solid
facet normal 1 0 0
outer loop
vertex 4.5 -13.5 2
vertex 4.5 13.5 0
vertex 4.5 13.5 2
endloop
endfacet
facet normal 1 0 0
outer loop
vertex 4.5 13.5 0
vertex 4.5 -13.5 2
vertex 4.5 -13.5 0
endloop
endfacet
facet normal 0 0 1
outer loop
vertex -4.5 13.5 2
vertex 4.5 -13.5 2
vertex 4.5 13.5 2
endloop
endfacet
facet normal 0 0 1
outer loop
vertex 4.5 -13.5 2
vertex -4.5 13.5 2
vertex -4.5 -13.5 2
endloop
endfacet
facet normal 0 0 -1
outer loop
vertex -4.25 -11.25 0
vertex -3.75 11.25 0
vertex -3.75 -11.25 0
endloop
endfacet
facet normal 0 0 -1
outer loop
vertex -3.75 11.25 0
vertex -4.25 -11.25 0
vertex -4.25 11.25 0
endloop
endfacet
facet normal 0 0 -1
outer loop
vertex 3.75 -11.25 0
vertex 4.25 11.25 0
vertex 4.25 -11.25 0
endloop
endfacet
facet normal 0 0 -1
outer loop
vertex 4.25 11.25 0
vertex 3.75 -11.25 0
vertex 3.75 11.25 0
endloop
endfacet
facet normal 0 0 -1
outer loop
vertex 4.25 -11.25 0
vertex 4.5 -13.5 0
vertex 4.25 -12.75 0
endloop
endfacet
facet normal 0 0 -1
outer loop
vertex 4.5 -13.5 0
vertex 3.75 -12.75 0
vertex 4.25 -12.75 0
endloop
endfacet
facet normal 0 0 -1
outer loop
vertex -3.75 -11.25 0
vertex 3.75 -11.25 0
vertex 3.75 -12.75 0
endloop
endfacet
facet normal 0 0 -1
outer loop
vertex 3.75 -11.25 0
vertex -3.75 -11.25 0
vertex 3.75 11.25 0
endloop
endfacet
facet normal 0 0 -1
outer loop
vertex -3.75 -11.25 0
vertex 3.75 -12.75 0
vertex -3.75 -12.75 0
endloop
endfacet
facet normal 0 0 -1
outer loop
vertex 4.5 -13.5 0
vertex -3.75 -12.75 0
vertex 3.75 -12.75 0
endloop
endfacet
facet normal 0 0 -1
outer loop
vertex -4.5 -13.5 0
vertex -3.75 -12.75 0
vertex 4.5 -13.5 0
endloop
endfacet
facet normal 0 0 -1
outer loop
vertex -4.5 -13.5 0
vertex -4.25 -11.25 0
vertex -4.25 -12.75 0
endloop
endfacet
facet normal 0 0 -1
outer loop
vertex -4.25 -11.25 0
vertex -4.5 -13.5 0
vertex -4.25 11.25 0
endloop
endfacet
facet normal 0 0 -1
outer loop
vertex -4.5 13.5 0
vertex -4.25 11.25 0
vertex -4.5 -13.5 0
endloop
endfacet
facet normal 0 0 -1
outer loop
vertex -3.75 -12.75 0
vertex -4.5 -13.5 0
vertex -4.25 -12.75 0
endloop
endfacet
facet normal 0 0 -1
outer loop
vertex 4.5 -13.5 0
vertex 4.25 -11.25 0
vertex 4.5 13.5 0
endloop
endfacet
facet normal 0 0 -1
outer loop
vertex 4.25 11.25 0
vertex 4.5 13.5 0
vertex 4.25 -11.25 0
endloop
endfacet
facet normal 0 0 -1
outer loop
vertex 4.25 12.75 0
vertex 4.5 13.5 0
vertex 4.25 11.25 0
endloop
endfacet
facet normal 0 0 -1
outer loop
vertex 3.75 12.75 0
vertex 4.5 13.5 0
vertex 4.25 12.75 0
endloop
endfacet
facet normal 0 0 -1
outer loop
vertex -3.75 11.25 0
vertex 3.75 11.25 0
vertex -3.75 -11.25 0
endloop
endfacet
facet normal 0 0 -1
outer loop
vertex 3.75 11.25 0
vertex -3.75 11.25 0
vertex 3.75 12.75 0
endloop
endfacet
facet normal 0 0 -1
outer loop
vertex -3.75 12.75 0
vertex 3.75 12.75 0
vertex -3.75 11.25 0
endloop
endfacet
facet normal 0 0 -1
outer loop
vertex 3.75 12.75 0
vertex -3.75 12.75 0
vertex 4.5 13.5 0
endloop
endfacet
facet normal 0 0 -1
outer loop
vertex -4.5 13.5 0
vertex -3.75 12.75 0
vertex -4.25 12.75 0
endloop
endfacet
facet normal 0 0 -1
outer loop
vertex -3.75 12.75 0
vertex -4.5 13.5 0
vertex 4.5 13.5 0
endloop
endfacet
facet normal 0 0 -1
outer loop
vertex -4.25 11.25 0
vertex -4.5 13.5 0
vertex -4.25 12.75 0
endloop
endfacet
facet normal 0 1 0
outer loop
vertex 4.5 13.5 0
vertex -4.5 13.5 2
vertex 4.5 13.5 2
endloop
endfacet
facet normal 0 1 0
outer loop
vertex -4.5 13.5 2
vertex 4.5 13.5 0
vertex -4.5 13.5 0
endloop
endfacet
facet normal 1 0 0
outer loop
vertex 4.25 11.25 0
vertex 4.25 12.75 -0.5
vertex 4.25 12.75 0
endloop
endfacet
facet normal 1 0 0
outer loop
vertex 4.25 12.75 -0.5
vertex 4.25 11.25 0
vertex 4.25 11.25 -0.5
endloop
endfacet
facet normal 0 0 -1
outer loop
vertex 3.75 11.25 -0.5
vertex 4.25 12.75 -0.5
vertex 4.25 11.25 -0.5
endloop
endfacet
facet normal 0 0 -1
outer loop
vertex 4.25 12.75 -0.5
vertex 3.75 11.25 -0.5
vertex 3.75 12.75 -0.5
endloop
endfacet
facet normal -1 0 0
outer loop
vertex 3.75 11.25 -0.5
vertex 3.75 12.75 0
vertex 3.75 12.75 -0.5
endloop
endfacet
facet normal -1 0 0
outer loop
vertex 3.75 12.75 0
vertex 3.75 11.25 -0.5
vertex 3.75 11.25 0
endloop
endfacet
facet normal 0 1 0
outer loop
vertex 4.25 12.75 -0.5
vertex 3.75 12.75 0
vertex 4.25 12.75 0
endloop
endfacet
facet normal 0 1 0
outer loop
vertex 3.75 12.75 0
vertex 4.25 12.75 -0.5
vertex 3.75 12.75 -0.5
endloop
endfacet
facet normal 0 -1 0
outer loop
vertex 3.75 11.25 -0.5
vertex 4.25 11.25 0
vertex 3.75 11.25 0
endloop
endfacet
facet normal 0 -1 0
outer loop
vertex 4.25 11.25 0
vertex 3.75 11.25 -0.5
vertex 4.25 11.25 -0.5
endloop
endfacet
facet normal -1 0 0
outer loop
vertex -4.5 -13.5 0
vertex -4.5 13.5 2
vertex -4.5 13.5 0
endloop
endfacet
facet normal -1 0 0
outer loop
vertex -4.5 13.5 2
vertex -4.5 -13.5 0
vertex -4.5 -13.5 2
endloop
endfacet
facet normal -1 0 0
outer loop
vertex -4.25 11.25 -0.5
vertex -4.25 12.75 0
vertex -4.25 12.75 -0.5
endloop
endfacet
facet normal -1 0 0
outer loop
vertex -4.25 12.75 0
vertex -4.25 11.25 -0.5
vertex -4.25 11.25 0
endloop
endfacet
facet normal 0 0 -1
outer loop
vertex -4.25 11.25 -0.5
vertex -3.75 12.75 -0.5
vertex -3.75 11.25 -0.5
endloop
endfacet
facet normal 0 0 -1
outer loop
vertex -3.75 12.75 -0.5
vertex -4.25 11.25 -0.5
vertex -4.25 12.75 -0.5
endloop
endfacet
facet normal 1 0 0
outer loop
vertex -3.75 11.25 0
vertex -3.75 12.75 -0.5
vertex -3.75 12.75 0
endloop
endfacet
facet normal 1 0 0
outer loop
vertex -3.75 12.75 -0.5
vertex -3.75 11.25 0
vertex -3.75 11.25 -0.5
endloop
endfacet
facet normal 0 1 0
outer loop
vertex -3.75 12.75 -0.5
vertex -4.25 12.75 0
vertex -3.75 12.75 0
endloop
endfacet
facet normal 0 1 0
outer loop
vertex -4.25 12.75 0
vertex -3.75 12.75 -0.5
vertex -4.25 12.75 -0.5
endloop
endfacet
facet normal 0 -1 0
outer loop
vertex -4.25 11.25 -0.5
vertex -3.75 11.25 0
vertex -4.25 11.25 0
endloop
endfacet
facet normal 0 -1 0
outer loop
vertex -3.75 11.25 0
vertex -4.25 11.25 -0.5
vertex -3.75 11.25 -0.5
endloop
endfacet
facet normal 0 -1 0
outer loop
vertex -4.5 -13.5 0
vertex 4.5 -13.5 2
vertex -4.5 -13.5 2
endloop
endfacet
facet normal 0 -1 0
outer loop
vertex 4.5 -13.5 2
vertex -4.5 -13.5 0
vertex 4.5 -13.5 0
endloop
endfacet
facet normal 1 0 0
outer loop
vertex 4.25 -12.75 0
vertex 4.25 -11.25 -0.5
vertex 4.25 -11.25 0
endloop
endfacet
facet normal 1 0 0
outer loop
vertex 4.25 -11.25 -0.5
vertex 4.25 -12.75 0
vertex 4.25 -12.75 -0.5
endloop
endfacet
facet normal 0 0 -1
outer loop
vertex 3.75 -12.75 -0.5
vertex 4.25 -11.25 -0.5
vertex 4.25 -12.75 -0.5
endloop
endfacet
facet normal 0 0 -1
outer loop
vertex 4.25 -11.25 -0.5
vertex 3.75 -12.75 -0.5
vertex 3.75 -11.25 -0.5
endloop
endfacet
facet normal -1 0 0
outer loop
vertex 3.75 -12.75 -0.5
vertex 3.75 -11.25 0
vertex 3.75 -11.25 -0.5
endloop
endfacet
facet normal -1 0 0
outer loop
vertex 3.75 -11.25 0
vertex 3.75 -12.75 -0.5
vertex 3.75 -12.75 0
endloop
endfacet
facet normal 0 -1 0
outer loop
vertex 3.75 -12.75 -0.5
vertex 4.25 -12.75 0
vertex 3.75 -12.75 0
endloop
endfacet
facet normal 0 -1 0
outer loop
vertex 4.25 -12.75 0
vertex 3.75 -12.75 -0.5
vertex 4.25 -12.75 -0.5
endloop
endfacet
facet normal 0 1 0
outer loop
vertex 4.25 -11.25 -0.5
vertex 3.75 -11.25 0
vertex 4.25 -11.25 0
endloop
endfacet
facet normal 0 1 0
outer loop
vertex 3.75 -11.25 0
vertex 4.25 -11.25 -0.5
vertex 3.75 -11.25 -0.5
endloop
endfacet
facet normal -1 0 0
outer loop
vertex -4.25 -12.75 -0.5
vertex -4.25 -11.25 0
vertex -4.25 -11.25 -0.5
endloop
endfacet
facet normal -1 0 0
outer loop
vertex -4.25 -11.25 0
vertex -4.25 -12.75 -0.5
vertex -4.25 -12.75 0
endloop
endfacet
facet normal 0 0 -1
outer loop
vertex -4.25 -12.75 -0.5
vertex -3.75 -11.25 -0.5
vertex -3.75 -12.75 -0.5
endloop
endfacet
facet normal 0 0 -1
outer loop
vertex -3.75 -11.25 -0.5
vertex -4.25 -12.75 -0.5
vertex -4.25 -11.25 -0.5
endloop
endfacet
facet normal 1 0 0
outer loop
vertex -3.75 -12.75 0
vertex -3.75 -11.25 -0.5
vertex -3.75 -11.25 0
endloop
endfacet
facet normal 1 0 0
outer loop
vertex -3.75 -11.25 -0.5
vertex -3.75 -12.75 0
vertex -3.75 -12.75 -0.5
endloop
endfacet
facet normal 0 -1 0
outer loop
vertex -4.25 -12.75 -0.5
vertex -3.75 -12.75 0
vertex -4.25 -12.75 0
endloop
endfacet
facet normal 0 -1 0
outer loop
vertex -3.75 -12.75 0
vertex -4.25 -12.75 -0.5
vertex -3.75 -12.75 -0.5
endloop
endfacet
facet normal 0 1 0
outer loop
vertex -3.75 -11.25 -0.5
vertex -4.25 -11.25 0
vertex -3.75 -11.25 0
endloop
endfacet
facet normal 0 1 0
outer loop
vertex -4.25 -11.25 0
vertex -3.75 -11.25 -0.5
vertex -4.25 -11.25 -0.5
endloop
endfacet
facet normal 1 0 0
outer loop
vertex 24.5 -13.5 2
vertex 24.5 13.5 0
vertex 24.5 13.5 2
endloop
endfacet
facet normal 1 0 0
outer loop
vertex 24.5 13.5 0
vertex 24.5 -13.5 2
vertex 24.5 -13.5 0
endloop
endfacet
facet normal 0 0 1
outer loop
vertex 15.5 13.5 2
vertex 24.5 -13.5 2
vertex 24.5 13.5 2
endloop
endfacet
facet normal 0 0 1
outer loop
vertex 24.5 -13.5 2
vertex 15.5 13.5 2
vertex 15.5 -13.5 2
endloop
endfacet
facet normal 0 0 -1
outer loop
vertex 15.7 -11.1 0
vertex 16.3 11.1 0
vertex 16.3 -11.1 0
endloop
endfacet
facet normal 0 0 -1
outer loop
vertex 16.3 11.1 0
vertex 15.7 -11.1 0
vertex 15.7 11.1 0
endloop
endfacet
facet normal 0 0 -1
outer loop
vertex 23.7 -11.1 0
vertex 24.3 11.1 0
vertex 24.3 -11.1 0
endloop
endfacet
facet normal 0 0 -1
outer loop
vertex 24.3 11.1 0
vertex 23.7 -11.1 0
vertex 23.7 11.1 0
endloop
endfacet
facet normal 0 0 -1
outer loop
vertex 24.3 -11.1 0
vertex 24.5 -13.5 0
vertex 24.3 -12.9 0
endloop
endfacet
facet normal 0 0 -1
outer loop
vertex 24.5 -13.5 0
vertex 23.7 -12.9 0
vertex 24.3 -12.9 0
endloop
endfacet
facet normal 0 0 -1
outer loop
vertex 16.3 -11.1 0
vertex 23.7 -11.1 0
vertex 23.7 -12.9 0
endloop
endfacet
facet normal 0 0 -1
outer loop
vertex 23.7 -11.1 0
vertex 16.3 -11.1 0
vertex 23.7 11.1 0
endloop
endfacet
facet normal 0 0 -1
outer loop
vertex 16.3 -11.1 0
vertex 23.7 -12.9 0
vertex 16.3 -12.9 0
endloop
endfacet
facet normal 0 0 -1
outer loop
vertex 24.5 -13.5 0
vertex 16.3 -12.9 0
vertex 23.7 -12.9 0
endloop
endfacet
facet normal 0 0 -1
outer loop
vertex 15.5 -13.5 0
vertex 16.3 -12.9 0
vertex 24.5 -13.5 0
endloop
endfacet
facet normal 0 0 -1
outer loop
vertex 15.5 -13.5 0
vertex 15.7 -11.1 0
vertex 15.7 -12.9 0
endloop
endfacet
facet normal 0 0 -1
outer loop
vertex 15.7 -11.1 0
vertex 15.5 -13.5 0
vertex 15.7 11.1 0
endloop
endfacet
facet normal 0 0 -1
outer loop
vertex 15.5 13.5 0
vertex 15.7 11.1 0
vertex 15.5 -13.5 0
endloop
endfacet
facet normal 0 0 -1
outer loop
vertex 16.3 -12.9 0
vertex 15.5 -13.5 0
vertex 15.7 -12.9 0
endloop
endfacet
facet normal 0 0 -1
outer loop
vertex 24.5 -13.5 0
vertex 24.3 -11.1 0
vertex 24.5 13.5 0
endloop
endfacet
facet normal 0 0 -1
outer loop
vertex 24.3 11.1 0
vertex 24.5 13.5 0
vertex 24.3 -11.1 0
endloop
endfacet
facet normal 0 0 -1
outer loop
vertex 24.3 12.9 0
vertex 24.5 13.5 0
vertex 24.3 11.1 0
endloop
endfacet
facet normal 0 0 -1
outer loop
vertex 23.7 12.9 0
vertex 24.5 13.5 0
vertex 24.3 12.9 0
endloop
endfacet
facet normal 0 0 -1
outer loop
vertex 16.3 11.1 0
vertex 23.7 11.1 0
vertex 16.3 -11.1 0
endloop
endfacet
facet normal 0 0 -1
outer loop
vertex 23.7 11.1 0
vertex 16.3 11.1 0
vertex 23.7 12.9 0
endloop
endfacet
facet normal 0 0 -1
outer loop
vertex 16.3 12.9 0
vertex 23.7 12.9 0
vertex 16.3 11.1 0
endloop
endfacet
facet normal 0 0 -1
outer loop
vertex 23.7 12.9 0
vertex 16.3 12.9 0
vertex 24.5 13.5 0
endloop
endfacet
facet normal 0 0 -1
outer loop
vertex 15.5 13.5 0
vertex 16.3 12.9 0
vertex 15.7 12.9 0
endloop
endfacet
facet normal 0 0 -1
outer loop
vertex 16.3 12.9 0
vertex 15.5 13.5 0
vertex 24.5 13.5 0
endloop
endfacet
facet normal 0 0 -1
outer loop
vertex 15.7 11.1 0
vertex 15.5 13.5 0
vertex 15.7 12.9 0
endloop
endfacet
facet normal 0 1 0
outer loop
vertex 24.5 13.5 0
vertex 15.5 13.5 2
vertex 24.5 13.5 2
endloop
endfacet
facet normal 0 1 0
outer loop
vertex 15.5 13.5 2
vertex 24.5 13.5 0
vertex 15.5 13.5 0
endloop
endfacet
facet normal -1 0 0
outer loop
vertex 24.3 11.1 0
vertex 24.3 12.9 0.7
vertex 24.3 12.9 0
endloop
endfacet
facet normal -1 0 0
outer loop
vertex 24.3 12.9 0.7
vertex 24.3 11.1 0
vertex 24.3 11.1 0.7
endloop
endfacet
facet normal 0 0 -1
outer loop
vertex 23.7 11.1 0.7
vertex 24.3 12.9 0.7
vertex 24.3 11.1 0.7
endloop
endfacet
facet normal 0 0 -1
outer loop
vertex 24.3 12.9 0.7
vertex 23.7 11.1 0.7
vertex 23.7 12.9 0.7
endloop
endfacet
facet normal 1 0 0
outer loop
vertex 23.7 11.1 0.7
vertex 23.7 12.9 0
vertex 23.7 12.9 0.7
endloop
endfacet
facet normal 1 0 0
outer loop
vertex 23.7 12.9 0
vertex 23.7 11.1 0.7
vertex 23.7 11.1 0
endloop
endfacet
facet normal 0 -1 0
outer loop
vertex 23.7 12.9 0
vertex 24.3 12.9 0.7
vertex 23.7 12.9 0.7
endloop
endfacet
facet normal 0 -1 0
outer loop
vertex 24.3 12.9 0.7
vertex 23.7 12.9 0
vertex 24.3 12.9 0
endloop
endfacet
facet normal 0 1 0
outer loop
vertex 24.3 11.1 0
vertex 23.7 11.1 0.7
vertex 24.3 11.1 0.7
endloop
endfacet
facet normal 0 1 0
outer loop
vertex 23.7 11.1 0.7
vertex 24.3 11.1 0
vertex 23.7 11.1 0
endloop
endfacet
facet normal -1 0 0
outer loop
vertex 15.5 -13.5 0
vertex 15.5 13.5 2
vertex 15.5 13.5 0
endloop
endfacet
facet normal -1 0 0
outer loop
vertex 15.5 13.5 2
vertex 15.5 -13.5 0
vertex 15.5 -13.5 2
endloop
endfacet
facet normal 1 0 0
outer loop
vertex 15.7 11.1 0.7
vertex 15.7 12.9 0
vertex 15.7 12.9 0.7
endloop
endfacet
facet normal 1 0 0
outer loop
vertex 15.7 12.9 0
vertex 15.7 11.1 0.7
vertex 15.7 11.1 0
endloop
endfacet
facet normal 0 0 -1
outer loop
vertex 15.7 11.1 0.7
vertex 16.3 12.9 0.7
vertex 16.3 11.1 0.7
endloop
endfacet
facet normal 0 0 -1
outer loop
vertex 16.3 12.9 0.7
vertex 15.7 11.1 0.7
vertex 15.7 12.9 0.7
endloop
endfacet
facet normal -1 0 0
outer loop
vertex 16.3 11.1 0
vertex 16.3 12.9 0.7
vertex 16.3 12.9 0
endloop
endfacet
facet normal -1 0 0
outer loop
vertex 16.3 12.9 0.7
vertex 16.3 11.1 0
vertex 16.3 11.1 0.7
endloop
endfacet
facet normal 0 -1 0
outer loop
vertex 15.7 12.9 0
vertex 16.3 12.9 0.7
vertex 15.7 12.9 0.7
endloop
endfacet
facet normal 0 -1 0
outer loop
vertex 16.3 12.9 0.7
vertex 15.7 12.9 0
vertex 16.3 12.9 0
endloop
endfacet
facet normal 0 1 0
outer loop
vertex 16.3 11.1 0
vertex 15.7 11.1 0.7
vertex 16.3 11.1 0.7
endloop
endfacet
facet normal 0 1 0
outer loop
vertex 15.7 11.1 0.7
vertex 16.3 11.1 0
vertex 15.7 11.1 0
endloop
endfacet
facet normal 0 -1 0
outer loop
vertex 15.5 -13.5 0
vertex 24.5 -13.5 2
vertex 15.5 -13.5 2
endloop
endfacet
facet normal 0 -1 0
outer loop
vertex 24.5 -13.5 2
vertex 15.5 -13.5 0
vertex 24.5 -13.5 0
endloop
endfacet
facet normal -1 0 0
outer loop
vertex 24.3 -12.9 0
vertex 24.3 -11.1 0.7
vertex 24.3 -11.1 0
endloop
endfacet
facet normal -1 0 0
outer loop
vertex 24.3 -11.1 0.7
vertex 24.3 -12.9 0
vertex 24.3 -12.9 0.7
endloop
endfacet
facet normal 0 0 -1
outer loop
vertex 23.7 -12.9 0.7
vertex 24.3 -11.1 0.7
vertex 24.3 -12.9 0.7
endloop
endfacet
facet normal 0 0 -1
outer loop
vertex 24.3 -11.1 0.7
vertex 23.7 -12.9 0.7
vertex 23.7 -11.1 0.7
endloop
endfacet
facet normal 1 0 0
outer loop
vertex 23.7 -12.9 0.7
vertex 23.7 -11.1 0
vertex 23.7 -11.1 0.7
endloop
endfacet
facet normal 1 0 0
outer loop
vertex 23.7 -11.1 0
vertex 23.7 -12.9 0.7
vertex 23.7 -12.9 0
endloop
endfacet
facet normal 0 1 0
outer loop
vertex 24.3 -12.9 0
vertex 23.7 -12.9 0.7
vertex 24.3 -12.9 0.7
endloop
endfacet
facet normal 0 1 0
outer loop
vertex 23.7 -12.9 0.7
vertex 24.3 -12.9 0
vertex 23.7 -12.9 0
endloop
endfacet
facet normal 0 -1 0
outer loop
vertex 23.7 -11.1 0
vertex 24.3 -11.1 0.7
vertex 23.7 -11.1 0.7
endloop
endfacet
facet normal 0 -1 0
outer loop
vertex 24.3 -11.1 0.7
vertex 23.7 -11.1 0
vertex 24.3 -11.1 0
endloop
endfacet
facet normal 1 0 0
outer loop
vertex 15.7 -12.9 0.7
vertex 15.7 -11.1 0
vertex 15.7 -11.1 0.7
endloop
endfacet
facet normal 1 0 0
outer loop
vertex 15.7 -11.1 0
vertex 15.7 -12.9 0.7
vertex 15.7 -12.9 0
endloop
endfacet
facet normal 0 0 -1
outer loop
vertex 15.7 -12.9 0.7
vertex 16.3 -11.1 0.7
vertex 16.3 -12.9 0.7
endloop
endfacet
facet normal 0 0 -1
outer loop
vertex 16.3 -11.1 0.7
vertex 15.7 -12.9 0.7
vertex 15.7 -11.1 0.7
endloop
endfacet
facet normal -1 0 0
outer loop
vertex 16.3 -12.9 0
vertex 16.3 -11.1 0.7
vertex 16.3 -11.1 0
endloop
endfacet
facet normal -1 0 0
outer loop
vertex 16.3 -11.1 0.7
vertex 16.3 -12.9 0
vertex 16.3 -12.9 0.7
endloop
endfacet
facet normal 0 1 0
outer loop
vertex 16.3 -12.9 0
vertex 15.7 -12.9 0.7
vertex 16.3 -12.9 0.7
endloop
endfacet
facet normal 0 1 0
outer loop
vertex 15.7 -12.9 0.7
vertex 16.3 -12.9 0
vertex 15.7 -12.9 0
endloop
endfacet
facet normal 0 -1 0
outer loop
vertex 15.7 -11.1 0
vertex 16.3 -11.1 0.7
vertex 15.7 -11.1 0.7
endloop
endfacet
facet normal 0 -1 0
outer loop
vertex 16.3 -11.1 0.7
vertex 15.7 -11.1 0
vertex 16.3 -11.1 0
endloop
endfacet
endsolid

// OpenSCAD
union() {
	scale(v = [0.5000000000, 1.5000000000, 1]) {
		union() {
			union() {
				union() {
					cube(size = [9, 9, 2]);
					translate(v = [8, 8, -0.5000000000]) {
						scale(v = 1) {
							translate(v = [-0.5000000000, -0.5000000000]) {
								cube();
							}
						}
					}
				}
				mirror(v = [1, 0, 0]) {
					union() {
						cube(size = [9, 9, 2]);
						translate(v = [8, 8, -0.5000000000]) {
							scale(v = 1) {
								translate(v = [-0.5000000000, -0.5000000000]) {
									cube();
								}
							}
						}
					}
				}
			}
			mirror(v = [0, 1, 0]) {
				union() {
					union() {
						cube(size = [9, 9, 2]);
						translate(v = [8, 8, -0.5000000000]) {
							scale(v = 1) {
								translate(v = [-0.5000000000, -0.5000000000]) {
									cube();
								}
							}
						}
					}
					mirror(v = [1, 0, 0]) {
						union() {
							cube(size = [9, 9, 2]);
							translate(v = [8, 8, -0.5000000000]) {
								scale(v = 1) {
									translate(v = [-0.5000000000, -0.5000000000]) {
										cube();
									}
								}
							}
						}
					}
				}
			}
		}
	}
	translate(v = [20, 0]) {
		scale(v = [0.5000000000, 1.5000000000, 1]) {
			union() {
				union() {
					difference() {
						cube(size = [9, 9, 2]);
						translate(v = [8, 8, -0.5000000000]) {
							scale(v = 1.2000000000) {
								translate(v = [-0.5000000000, -0.5000000000]) {
									cube();
								}
							}
						}
					}
					mirror(v = [1, 0, 0]) {
						difference() {
							cube(size = [9, 9, 2]);
							translate(v = [8, 8, -0.5000000000]) {
								scale(v = 1.2000000000) {
									translate(v = [-0.5000000000, -0.5000000000]) {
										cube();
									}
								}
							}
						}
					}
				}
				mirror(v = [0, 1, 0]) {
					union() {
						difference() {
							cube(size = [9, 9, 2]);
							translate(v = [8, 8, -0.5000000000]) {
								scale(v = 1.2000000000) {
									translate(v = [-0.5000000000, -0.5000000000]) {
										cube();
									}
								}
							}
						}
						mirror(v = [1, 0, 0]) {
							difference() {
								cube(size = [9, 9, 2]);
								translate(v = [8, 8, -0.5000000000]) {
									scale(v = 1.2000000000) {
										translate(v = [-0.5000000000, -0.5000000000]) {
											cube();
										}
									}
								}
							}
						}
					}
				}
			}
		}
	}
}
